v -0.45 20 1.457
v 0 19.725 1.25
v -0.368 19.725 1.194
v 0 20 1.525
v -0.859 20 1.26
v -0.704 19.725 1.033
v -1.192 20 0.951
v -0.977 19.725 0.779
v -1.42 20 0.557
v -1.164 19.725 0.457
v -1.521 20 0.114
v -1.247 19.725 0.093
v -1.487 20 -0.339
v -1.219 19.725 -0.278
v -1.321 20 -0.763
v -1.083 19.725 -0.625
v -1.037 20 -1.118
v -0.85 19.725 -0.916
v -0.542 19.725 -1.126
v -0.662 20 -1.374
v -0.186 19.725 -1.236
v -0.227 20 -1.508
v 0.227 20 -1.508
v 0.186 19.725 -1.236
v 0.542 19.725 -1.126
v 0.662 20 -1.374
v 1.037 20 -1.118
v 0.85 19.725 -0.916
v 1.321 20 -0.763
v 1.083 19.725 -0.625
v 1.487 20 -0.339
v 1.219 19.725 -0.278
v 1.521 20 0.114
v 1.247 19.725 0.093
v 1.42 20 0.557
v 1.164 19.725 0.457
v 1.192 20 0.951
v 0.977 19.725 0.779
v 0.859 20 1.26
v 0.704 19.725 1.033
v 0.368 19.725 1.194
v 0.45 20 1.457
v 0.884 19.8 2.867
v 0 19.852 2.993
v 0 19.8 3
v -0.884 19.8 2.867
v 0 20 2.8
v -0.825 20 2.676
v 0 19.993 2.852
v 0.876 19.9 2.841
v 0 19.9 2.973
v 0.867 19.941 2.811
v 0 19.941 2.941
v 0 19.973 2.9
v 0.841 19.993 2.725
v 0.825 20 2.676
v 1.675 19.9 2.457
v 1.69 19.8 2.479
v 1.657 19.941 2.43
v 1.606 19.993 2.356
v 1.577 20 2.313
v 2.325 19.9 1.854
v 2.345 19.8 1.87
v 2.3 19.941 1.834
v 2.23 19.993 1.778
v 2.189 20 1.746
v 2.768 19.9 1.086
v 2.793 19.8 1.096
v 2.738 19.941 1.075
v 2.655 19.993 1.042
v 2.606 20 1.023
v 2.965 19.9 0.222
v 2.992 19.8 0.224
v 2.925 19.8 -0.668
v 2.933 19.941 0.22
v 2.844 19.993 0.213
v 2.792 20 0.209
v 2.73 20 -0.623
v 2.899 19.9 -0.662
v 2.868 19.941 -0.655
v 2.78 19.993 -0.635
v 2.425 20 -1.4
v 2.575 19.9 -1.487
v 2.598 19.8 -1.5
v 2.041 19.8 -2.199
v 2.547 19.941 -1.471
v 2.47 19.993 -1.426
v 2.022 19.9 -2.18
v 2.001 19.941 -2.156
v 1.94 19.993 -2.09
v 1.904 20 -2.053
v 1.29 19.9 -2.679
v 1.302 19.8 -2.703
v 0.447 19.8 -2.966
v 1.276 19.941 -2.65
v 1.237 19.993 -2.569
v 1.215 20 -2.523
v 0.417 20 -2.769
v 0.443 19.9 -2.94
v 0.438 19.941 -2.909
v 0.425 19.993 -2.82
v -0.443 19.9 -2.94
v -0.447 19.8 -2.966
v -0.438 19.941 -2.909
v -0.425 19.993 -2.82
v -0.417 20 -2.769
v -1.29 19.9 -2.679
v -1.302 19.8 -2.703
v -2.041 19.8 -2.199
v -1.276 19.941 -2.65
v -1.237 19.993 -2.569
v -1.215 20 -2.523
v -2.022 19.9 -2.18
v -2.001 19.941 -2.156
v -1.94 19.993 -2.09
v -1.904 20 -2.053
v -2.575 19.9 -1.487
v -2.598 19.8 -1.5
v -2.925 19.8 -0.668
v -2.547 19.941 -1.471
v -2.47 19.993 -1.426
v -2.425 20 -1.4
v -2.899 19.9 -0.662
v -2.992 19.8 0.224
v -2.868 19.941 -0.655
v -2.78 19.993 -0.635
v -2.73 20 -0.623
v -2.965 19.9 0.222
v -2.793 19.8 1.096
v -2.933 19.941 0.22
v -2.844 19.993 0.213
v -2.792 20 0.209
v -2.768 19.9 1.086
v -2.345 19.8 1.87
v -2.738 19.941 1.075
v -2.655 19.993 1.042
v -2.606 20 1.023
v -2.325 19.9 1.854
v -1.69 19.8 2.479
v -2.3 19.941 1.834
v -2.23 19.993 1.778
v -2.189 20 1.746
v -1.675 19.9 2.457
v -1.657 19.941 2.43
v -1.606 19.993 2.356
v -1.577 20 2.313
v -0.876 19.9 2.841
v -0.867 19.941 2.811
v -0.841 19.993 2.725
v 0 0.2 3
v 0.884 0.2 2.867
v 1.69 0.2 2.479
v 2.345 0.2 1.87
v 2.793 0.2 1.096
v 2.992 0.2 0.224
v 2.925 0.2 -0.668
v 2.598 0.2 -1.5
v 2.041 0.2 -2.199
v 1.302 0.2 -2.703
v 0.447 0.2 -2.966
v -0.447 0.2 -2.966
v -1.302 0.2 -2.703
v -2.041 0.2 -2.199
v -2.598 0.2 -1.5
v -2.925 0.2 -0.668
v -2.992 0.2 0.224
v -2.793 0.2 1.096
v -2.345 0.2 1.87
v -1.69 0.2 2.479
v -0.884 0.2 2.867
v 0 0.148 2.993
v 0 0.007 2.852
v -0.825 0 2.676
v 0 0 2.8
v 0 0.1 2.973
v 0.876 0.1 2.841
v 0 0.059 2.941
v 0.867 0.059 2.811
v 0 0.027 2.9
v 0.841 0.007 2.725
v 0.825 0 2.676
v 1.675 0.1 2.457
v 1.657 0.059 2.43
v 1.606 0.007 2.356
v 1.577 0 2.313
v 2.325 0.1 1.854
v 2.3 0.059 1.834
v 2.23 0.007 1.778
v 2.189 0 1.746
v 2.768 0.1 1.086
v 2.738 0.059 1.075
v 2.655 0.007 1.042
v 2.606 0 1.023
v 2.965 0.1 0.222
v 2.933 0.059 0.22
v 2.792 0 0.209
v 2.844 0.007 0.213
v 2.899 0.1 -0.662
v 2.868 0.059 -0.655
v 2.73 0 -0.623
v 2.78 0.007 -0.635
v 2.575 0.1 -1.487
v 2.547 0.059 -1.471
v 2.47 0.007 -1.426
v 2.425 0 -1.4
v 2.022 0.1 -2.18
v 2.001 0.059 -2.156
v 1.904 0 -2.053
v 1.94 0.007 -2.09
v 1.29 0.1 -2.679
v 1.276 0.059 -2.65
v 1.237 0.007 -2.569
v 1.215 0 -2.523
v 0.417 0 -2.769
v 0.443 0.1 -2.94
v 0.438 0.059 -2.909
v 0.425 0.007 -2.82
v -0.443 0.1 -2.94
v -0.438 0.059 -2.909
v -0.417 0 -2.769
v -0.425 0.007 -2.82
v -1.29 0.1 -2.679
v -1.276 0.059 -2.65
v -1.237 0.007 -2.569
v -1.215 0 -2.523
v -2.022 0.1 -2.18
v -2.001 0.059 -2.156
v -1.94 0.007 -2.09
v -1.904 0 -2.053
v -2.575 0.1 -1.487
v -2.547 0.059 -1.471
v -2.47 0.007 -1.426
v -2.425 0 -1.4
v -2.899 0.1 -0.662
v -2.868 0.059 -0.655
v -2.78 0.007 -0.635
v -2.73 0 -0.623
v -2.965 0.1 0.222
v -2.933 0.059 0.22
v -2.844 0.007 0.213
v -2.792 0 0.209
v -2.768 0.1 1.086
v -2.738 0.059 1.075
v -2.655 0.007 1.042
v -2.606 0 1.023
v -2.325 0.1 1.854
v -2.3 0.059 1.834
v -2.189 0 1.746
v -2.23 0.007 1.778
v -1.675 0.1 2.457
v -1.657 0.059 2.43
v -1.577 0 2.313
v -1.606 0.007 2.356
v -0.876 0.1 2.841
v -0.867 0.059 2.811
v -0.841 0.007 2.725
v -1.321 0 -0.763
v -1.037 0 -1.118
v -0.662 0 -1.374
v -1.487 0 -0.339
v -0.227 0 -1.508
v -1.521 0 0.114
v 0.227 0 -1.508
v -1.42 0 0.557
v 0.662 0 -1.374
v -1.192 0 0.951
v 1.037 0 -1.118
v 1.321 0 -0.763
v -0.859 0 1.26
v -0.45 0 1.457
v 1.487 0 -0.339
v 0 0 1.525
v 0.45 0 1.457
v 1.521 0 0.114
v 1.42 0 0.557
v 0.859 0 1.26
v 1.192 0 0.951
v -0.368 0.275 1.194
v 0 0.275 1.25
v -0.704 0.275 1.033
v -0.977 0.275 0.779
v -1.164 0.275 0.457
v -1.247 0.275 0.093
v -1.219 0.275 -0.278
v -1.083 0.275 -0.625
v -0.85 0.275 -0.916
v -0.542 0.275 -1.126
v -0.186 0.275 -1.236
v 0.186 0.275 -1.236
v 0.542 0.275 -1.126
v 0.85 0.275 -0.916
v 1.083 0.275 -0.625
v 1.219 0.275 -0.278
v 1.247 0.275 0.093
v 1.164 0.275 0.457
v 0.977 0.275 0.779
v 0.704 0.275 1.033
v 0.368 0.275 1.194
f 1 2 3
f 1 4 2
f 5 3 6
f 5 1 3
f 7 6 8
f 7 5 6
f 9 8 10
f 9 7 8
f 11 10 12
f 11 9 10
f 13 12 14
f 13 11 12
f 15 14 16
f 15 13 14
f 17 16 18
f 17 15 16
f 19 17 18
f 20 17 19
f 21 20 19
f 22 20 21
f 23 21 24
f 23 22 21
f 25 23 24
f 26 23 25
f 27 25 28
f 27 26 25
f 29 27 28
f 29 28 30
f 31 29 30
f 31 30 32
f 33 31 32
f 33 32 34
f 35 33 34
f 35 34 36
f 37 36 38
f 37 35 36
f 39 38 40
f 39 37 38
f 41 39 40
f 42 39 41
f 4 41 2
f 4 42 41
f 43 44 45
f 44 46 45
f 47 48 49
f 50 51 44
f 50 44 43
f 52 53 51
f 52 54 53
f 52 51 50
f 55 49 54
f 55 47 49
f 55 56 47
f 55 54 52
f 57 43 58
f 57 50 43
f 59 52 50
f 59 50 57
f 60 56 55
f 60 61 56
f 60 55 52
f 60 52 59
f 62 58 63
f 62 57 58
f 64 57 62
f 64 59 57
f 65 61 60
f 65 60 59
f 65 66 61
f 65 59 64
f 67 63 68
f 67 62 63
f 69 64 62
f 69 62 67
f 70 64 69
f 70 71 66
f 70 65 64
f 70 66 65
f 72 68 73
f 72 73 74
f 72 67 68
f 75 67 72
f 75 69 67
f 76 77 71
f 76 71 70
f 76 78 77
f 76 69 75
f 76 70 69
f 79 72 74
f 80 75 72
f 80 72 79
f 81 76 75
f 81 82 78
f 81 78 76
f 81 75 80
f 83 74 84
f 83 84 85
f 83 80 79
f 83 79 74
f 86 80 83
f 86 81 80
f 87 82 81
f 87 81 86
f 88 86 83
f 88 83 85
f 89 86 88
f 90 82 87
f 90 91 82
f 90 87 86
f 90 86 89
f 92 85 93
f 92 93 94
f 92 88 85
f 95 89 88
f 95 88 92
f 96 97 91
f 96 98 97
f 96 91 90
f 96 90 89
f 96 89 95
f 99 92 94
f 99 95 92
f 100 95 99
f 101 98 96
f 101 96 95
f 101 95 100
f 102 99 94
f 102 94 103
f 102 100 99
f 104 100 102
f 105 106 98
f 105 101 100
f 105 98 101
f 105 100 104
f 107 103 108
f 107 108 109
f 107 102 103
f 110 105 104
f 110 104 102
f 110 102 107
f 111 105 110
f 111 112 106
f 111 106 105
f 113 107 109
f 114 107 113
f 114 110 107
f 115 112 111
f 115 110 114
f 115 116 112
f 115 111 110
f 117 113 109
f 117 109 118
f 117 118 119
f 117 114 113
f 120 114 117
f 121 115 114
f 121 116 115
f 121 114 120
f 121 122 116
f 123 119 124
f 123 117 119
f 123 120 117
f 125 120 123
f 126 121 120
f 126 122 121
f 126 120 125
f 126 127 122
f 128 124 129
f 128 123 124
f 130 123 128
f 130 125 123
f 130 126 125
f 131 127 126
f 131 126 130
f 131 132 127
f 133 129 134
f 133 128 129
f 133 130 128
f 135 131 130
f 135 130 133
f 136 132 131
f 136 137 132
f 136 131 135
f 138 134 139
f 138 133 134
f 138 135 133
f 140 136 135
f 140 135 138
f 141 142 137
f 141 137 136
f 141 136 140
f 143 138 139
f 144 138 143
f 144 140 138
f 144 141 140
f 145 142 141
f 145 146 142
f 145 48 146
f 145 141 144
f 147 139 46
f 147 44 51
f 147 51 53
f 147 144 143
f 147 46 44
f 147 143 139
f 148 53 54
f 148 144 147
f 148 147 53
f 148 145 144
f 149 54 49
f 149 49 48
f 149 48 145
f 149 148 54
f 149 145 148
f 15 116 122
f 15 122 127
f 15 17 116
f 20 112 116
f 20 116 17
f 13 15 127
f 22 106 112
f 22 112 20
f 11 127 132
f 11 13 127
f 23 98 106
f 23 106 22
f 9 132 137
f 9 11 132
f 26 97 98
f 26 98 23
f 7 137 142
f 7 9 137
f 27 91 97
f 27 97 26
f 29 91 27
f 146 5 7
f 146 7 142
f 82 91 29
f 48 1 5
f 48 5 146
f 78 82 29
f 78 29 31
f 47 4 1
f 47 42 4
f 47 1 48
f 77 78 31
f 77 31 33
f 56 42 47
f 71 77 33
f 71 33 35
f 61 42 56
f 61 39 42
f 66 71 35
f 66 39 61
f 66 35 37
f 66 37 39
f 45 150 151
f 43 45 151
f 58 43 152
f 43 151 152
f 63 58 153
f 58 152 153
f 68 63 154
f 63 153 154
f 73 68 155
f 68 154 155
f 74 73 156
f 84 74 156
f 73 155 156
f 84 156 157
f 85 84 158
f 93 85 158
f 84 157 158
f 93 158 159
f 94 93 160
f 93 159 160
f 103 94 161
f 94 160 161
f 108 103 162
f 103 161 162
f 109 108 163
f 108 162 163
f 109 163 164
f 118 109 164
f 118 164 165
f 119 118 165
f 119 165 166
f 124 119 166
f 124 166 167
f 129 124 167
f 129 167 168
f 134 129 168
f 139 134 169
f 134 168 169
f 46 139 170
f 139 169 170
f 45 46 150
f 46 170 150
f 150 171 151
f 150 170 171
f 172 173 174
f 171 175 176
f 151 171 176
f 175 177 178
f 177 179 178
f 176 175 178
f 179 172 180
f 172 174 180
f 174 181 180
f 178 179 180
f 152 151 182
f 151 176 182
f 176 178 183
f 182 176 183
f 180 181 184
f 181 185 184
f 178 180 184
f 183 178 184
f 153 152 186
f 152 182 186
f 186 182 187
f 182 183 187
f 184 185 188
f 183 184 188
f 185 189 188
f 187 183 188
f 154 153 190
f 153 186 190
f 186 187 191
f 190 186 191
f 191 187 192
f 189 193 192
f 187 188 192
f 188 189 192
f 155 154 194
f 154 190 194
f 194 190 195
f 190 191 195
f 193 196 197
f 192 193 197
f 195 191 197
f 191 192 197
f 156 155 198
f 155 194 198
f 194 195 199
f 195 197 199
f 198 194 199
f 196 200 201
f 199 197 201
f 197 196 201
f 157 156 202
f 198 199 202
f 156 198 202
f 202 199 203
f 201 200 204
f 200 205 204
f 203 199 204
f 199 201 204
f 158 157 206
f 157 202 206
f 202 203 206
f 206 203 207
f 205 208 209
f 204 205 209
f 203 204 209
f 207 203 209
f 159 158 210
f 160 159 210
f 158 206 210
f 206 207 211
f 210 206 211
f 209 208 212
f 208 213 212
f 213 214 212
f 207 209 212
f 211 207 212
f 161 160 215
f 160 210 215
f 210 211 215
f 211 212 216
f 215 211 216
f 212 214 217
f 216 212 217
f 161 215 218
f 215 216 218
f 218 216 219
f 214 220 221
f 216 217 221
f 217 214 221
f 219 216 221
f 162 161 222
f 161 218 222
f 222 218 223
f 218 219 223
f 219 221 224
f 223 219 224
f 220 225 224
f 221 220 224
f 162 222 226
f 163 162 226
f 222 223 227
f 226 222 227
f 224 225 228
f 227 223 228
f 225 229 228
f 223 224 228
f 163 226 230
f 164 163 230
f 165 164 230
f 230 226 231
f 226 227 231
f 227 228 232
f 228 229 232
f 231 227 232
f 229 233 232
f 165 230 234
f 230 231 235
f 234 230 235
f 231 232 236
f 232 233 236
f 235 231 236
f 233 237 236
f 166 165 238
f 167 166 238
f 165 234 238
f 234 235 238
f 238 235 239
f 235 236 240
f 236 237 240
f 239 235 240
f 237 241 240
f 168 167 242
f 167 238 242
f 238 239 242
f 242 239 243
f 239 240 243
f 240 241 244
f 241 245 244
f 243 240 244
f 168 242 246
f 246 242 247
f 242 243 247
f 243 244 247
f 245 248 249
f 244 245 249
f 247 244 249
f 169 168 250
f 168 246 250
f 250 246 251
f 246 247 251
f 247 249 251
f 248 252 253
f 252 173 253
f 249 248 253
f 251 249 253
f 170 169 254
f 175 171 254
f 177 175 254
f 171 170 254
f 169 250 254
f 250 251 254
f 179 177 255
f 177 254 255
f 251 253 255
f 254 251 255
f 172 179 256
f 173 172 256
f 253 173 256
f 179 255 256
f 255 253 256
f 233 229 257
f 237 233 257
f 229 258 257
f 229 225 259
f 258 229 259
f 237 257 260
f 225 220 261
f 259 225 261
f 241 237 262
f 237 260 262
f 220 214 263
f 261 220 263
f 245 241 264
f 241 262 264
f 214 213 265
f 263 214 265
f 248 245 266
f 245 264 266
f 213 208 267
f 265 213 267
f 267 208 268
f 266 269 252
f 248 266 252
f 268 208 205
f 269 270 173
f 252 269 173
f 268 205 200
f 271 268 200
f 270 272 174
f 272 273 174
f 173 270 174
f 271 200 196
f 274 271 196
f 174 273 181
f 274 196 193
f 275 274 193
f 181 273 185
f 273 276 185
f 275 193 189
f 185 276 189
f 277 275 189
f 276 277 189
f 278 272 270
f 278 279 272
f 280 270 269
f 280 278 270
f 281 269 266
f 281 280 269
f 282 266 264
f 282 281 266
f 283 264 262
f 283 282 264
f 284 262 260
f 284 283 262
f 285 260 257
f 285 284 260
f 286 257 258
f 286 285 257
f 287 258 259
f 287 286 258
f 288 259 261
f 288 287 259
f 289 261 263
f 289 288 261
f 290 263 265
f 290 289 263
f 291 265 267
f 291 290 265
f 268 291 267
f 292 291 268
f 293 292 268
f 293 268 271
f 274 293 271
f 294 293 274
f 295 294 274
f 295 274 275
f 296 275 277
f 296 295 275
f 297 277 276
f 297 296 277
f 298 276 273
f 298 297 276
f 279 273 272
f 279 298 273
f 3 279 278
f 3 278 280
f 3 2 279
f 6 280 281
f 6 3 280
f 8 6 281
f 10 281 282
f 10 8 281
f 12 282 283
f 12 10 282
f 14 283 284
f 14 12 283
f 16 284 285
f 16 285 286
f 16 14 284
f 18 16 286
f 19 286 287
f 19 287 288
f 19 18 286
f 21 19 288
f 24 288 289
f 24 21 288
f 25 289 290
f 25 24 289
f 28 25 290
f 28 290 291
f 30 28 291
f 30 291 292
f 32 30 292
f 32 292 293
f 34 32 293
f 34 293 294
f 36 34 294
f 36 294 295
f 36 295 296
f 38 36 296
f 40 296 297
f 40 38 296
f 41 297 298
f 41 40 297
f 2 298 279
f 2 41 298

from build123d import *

# Parameters (mm, degrees)
SKETCH1_R           = 3
BOSS_EXTRUDE1_DEPTH = 20
FILLET1_R           = 0.2


with BuildPart() as part:
    # Sketch1 → Boss-Extrude1 (new body)
    with BuildSketch(Plane(origin=(0, 0, 0), x_dir=(1, 0, 0), z_dir=(0, 1, 0))):
        with Locations(Location((0, 0, 0), (0, 0, 270))):
            Circle(SKETCH1_R)
    extrude(amount=BOSS_EXTRUDE1_DEPTH)

    # Fillet1
    fillet1_edges = [part.edges().sort_by_distance(p)[0] for p in [
        (0, 0, -3),
        (0, 20, -3),
    ]]
    fillet(fillet1_edges, radius=FILLET1_R)

    # Sketch3 → M3x0.5 Tapped Hole1 (revolve, cut)
    with BuildSketch(Plane(origin=(0, 20, 0), x_dir=(0, 0, 1), z_dir=(1, 0, 0))):
        Polygon((0, 0), (0, 20), (1.525, 20), (1.25, 19.725), (1.25, 0.275), (1.525, 0), align=None)
    revolve(axis=Axis((0, 26.35, 0), (0, -1, 0)), mode=Mode.SUBTRACT)


solid = part.part
